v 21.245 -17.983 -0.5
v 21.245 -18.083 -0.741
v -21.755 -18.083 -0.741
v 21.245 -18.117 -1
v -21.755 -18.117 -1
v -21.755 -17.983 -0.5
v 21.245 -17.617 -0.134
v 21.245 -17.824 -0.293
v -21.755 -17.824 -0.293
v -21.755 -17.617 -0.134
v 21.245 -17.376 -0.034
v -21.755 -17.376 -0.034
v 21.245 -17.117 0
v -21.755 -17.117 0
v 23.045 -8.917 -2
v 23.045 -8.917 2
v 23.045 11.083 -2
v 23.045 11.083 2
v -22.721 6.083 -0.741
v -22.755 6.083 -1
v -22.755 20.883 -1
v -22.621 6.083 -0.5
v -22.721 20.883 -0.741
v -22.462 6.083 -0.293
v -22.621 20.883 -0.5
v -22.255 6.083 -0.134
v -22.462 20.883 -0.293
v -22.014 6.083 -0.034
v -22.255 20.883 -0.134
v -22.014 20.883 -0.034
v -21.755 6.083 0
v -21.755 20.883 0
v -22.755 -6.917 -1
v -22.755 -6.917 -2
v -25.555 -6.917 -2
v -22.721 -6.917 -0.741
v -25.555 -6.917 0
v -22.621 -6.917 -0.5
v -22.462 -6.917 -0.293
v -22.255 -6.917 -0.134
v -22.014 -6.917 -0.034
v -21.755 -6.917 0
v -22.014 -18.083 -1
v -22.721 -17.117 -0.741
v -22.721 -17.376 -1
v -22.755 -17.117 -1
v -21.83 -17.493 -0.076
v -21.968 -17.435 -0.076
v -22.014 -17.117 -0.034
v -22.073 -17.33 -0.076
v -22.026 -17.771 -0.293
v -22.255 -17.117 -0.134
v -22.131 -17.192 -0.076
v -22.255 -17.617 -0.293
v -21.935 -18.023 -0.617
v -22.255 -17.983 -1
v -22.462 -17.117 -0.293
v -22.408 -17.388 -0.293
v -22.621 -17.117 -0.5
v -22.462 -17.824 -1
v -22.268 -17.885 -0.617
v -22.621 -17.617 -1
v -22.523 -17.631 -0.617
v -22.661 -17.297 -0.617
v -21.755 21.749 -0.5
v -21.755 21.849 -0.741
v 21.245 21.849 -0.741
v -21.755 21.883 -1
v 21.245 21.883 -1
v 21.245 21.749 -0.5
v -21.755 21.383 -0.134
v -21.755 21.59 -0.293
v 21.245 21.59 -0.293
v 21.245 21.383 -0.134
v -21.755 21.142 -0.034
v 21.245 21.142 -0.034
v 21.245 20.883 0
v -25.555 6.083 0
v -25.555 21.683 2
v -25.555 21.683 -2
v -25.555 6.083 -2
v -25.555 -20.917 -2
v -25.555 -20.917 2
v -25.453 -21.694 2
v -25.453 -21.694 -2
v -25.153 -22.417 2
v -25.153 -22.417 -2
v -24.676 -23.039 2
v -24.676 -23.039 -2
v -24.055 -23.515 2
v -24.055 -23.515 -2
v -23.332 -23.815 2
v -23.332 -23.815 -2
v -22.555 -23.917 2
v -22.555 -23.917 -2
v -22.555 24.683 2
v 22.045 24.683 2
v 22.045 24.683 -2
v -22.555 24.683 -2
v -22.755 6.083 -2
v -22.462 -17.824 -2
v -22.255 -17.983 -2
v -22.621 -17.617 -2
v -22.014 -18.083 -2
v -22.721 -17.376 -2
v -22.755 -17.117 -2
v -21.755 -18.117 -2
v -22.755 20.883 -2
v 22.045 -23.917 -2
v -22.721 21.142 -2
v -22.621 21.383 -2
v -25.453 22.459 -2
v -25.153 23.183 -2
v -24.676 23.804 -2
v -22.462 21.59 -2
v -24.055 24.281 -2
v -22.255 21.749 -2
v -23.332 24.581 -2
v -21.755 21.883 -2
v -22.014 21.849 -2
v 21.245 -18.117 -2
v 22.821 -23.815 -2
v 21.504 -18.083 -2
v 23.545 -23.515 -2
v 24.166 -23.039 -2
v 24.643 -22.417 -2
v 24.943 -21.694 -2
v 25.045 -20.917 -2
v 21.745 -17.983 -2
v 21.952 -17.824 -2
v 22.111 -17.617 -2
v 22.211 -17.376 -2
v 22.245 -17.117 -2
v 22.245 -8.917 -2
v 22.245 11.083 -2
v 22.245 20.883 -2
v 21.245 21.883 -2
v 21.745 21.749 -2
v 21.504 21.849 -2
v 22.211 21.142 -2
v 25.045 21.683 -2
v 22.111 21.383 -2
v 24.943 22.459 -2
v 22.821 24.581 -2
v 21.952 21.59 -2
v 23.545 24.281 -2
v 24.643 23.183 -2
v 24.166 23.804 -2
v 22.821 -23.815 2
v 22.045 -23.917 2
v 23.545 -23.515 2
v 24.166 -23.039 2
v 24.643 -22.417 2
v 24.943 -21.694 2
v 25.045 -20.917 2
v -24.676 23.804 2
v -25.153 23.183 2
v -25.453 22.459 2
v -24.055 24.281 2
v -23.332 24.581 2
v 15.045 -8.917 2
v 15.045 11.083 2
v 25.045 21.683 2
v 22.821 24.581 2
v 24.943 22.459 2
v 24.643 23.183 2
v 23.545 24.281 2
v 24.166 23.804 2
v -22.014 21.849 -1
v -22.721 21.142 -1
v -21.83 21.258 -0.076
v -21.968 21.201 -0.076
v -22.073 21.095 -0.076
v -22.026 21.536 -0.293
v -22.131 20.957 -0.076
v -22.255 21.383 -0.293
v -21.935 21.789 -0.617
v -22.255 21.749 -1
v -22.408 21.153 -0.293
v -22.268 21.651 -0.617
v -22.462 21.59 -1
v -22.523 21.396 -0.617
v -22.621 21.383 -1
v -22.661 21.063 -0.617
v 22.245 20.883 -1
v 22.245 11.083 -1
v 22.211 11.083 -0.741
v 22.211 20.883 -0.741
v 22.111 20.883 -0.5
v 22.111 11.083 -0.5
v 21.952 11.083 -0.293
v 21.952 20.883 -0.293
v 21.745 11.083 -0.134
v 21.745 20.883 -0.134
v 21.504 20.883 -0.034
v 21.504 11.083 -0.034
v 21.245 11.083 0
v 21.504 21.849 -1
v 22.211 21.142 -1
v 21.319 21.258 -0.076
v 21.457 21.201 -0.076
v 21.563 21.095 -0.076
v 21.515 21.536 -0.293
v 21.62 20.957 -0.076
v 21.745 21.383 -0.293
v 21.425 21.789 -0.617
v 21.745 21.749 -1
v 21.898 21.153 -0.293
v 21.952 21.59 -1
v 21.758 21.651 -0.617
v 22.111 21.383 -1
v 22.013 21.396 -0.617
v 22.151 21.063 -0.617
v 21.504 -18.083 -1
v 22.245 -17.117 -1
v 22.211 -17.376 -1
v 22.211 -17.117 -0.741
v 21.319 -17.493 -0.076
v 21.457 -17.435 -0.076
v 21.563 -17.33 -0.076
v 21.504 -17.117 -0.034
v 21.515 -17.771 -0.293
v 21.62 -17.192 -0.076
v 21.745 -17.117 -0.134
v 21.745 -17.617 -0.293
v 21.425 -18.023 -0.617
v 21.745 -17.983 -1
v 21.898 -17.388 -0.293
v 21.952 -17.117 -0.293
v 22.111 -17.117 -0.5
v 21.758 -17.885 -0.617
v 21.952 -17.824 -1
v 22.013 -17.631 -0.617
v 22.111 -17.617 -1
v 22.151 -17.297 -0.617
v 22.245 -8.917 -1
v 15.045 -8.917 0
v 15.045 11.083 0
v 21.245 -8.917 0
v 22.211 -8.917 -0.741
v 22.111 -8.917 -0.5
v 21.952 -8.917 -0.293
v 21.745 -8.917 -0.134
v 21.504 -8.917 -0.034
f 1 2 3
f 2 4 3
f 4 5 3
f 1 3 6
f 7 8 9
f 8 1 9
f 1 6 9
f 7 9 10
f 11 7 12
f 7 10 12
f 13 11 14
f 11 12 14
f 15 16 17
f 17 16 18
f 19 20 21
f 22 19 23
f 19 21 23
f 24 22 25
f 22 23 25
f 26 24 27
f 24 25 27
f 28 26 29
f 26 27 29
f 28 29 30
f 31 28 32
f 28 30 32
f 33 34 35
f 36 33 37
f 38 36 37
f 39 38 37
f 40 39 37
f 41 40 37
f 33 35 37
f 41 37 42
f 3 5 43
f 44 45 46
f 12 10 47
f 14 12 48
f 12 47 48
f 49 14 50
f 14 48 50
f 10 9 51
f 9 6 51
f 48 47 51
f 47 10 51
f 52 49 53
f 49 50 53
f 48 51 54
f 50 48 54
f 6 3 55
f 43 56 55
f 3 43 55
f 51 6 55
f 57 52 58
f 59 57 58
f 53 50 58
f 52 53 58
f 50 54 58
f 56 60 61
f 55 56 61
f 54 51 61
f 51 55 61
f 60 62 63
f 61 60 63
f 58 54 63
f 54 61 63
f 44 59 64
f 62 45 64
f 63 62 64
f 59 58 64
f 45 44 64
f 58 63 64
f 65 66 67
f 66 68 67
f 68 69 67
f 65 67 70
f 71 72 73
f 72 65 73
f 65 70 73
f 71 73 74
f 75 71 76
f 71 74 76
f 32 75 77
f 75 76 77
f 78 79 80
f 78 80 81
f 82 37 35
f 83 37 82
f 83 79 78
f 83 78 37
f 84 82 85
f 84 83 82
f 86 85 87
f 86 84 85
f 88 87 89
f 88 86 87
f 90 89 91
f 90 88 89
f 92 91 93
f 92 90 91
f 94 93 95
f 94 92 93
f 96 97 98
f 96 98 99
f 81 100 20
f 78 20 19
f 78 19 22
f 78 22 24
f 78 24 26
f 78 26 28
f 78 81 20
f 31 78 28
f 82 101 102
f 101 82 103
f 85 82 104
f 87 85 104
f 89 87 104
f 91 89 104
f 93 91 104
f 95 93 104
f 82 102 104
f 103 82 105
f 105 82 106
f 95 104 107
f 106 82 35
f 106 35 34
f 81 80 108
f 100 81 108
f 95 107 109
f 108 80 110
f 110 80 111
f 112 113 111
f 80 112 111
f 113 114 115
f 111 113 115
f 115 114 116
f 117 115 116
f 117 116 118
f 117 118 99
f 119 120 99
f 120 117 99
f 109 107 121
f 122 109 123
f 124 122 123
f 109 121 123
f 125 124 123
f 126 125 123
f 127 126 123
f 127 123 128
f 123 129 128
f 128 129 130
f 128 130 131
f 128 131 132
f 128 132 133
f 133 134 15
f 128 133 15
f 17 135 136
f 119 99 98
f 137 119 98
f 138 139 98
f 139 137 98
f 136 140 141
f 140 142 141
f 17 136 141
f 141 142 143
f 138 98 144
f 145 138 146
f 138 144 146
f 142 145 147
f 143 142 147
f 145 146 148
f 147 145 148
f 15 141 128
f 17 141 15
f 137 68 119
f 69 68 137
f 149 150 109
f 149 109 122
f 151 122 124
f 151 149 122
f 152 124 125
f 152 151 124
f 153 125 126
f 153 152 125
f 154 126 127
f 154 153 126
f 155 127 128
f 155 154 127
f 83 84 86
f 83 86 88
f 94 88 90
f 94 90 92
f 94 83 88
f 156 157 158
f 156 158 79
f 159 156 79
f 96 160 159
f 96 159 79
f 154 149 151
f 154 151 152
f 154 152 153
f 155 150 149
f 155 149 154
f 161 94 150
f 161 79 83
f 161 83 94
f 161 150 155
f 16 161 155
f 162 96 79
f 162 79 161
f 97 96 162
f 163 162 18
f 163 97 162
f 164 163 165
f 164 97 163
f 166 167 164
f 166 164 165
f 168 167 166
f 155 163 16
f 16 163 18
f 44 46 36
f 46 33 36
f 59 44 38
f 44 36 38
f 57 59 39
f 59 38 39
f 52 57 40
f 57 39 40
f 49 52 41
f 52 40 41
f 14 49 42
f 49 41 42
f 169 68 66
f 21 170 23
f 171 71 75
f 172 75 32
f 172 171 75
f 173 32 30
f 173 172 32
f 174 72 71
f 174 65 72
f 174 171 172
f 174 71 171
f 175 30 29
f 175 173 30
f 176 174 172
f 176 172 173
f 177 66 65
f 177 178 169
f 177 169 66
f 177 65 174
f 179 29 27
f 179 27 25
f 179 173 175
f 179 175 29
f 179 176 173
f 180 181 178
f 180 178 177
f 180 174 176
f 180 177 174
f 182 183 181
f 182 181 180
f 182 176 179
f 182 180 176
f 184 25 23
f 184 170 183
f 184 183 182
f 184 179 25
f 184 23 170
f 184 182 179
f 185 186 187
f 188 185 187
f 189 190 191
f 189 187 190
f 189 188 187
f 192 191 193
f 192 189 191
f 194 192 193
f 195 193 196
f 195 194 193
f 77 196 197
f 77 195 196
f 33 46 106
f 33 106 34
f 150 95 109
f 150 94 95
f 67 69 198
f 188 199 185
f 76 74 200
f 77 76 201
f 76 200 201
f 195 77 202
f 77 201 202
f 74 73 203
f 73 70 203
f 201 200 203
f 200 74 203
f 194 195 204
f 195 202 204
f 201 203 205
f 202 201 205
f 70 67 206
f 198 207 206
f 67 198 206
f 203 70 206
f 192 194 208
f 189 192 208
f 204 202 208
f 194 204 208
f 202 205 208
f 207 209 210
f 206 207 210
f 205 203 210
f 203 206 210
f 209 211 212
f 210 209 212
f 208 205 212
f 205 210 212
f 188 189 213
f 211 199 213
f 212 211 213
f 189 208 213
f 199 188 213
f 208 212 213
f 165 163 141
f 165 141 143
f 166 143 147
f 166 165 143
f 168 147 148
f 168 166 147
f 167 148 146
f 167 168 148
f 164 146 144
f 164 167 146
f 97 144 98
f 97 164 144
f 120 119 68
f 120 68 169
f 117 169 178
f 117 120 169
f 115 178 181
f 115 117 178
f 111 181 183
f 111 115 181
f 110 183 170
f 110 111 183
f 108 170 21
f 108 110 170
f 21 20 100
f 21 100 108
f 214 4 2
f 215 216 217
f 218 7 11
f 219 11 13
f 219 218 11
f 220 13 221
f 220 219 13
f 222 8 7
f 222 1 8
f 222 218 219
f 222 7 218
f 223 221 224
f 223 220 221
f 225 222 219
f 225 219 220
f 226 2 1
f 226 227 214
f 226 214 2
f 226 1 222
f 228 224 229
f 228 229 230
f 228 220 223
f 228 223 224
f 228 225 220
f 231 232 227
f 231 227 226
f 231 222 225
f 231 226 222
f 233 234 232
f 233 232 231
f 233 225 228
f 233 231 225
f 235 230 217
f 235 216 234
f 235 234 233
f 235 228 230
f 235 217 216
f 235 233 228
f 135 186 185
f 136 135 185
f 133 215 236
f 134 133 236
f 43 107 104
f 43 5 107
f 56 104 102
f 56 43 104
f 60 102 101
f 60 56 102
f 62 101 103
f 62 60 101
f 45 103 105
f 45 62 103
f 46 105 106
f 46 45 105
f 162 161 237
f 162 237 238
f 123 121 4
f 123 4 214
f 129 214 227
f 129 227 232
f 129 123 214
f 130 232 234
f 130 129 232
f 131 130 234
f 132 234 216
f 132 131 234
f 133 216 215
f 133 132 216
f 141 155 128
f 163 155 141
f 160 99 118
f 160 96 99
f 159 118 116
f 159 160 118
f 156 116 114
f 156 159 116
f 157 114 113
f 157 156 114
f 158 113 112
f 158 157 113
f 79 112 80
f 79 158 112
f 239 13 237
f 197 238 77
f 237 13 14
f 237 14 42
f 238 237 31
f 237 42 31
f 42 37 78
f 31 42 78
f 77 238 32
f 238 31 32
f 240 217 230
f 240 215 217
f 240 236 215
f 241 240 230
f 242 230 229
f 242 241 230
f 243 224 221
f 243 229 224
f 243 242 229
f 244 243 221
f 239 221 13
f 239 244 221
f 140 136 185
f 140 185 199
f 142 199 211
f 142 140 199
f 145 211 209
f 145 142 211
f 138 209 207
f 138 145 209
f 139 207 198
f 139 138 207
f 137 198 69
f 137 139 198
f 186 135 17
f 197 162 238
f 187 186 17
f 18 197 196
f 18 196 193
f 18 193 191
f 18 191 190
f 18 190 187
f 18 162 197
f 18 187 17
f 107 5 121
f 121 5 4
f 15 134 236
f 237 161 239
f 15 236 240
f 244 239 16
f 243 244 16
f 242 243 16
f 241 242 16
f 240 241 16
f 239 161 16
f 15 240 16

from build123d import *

# Parameters (mm, degrees)
SKETCH1_W           = 45
SKETCH1_H           = 40
BOSS_EXTRUDE1_DEPTH = 2
SKETCH2_W           = 2
SKETCH2_H           = 42.8
BOSS_EXTRUDE2_DEPTH = 45
FILLET1_R           = 1
SKETCH3_W           = 2
SKETCH3_H           = 13
CUT_EXTRUDE1_DEPTH  = 11
SKETCH4_W           = 8
SKETCH4_H           = 20
CUT_EXTRUDE2_DEPTH  = 11


with BuildPart() as part:
    # Sketch1 → Boss-Extrude1 (new, symmetric)
    with BuildSketch(Plane.XY):
        with BuildLine():
            Line((-22.555173768, -23.917239348), (22.044826232, -23.917239348))
            ThreePointArc((22.044826232, -23.917239348), (24.166146575, -23.038559691), (25.044826232, -20.917239348))
            Line((25.044826232, -20.917239348), (25.044826232, 21.682760652))
            ThreePointArc((25.044826232, 21.682760652), (24.166146575, 23.804080996), (22.044826232, 24.682760652))
            Line((22.044826232, 24.682760652), (-22.555173768, 24.682760652))
            ThreePointArc((-22.555173768, 24.682760652), (-24.676494112, 23.804080996), (-25.555173768, 21.682760652))
            Line((-25.555173768, 21.682760652), (-25.555173768, -20.917239348))
            ThreePointArc((-25.555173768, -20.917239348), (-24.676494112, -23.038559691), (-22.555173768, -23.917239348))
        make_face()
        with Locations((-0.255173768, 1.882760652)):
            Rectangle(SKETCH1_W, SKETCH1_H, mode=Mode.SUBTRACT)
    extrude(amount=BOSS_EXTRUDE1_DEPTH, both=True)

    # Sketch2 → Boss-Extrude2 (add)
    with BuildSketch(Plane(origin=(-22.755173768, 0, 0), x_dir=(0, 0, -1), z_dir=(1, 0, 0))):
        with Locations((-1, 0.482760652)):
            Rectangle(SKETCH2_W, SKETCH2_H)
    extrude(amount=BOSS_EXTRUDE2_DEPTH)

    # Fillet1
    fillet1_edges = [part.edges().sort_by_distance(p)[0] for p in [
        (22.244826232, 21.882760652, -1),
        (-22.755173768, 21.882760652, -1),
        (22.244826232, -18.117239348, -1),
        (-22.755173768, -18.117239348, -1),
        (-0.255173768, -18.117239348, 0),
        (-0.255173768, 21.882760652, 0),
        (-22.755173768, 1.882760652, 0),
        (22.244826232, 1.882760652, 0),
    ]]
    fillet(fillet1_edges, radius=FILLET1_R)

    # Sketch3 → Cut-Extrude1 (cut)
    with BuildSketch(Plane.ZY.offset(25.555173768)):
        with Locations((-1, -0.417239348)):
            Rectangle(SKETCH3_W, SKETCH3_H)
    extrude(amount=-CUT_EXTRUDE1_DEPTH, mode=Mode.SUBTRACT)

    # Sketch4 → Cut-Extrude2 (cut)
    with BuildSketch(Plane.XY.offset(2)):
        with Locations((19.044826232, 1.082760652)):
            Rectangle(SKETCH4_W, SKETCH4_H)
    extrude(amount=-CUT_EXTRUDE2_DEPTH, mode=Mode.SUBTRACT)


solid = part.part
